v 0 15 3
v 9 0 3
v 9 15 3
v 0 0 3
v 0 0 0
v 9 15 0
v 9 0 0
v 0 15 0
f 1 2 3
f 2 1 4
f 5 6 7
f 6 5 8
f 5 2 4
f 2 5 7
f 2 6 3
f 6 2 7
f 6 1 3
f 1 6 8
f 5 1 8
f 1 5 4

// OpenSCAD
// Generated by SolidPython 1.0.1 on 2020-07-29 00:46:55


cube(size = [9, 15, 3]);
/***********************************************
*********      SolidPython code:      **********
************************************************
 
# import packages: SolidPython
from solid import *
from solid.utils import *
from itertools import chain, combinations, permutations


class Resize:

    def __init__(self, scad_file):
        self.scad_file = scad_file
        #self.scad_file = import_scad(scad_file)
        # cone/cylinder param:
        self.r1 = 0
        self.r2 = 0
        self.h = 0
        # rectangular prism param:
        self.w = 0
        self.l = 0
        # ellipse param:
        self.r = 0

    # import OpenScad code (file name corresponds to shape)


    # classify shape + parameters
    def assign(self, param1, param2, param3):
        if self.scad_file == 'cone.scad':
            self.r1 = param1
            self.r2 = param2
            self.h = param3
        elif self.scad_file == 'cylinder.scad':
            self.r1 = param1
            self.r2 = param2
            self.h = param3
        elif self.scad_file == 'rectangularPrism.scad':
            self.h = param1
            self.l = param2
            self.w = param3
        else:
            self.r = param1
            self.h = param2

    # resize parameters
    def iterate(self):
        x = range(3, 20, 2)
        i = 1
        if self.scad_file == 'cone.scad':
            tempList = list(permutations(x, 2))
            for temp in tempList:
                param1 = temp[0]
                param2 = temp[1]
                filepath = 'produced_scad_files/' + 'cone' + str(param1) + '_' + str(param2) + '_' + '.scad'
                scad_render_to_file(cylinder(h=param1, r1=param2, r2=0), filepath)

        elif self.scad_file == 'cylinder.scad':
            tempList = list(permutations(x, 3))
            for temp in tempList:
                param1 = temp[0]
                param2 = temp[1]
                filepath = 'produced_scad_files/' + 'cylinder' + str(param1) + '_' + str(param2) + '_' + '.scad'
                scad_render_to_file(cylinder(h=param1, r1=param2, r2=param2), filepath)

        elif self.scad_file == 'rectangularPrism.scad':
            tempList = list(permutations(x, 3))
            for temp in tempList:
                param1 = temp[0]
                param2 = temp[1]
                param3 = temp[2]
                filepath = 'produced_scad_files/' + 'rectangularPrism' + str(param1) + '_' + str(param2) + '_' + str(
                    param3) + '.scad'
                scad_render_to_file(cube(size=(param1, param2, param3)), filepath)

        elif self.scad_file == 'ellipse.scad':
            tempList = list(permutations(x, 4))
            for temp in tempList:
                param1 = temp[0]
                param2 = temp[1]
                param3 = temp[2]
                param4 = temp[3]
                filepath = 'produced_scad_files/' + 'ellipse' + str(param1) + '_' + str(param2) + '_' + str(param3) + '_' + str(param4) + '.scad'
                scad_render_to_file(scale([param1, param2, param3])(sphere(r=param4)), filepath)

    def render_to_scadfile(self):
        scad_render_to_file(scad, 'example.scad') 
 
************************************************/
